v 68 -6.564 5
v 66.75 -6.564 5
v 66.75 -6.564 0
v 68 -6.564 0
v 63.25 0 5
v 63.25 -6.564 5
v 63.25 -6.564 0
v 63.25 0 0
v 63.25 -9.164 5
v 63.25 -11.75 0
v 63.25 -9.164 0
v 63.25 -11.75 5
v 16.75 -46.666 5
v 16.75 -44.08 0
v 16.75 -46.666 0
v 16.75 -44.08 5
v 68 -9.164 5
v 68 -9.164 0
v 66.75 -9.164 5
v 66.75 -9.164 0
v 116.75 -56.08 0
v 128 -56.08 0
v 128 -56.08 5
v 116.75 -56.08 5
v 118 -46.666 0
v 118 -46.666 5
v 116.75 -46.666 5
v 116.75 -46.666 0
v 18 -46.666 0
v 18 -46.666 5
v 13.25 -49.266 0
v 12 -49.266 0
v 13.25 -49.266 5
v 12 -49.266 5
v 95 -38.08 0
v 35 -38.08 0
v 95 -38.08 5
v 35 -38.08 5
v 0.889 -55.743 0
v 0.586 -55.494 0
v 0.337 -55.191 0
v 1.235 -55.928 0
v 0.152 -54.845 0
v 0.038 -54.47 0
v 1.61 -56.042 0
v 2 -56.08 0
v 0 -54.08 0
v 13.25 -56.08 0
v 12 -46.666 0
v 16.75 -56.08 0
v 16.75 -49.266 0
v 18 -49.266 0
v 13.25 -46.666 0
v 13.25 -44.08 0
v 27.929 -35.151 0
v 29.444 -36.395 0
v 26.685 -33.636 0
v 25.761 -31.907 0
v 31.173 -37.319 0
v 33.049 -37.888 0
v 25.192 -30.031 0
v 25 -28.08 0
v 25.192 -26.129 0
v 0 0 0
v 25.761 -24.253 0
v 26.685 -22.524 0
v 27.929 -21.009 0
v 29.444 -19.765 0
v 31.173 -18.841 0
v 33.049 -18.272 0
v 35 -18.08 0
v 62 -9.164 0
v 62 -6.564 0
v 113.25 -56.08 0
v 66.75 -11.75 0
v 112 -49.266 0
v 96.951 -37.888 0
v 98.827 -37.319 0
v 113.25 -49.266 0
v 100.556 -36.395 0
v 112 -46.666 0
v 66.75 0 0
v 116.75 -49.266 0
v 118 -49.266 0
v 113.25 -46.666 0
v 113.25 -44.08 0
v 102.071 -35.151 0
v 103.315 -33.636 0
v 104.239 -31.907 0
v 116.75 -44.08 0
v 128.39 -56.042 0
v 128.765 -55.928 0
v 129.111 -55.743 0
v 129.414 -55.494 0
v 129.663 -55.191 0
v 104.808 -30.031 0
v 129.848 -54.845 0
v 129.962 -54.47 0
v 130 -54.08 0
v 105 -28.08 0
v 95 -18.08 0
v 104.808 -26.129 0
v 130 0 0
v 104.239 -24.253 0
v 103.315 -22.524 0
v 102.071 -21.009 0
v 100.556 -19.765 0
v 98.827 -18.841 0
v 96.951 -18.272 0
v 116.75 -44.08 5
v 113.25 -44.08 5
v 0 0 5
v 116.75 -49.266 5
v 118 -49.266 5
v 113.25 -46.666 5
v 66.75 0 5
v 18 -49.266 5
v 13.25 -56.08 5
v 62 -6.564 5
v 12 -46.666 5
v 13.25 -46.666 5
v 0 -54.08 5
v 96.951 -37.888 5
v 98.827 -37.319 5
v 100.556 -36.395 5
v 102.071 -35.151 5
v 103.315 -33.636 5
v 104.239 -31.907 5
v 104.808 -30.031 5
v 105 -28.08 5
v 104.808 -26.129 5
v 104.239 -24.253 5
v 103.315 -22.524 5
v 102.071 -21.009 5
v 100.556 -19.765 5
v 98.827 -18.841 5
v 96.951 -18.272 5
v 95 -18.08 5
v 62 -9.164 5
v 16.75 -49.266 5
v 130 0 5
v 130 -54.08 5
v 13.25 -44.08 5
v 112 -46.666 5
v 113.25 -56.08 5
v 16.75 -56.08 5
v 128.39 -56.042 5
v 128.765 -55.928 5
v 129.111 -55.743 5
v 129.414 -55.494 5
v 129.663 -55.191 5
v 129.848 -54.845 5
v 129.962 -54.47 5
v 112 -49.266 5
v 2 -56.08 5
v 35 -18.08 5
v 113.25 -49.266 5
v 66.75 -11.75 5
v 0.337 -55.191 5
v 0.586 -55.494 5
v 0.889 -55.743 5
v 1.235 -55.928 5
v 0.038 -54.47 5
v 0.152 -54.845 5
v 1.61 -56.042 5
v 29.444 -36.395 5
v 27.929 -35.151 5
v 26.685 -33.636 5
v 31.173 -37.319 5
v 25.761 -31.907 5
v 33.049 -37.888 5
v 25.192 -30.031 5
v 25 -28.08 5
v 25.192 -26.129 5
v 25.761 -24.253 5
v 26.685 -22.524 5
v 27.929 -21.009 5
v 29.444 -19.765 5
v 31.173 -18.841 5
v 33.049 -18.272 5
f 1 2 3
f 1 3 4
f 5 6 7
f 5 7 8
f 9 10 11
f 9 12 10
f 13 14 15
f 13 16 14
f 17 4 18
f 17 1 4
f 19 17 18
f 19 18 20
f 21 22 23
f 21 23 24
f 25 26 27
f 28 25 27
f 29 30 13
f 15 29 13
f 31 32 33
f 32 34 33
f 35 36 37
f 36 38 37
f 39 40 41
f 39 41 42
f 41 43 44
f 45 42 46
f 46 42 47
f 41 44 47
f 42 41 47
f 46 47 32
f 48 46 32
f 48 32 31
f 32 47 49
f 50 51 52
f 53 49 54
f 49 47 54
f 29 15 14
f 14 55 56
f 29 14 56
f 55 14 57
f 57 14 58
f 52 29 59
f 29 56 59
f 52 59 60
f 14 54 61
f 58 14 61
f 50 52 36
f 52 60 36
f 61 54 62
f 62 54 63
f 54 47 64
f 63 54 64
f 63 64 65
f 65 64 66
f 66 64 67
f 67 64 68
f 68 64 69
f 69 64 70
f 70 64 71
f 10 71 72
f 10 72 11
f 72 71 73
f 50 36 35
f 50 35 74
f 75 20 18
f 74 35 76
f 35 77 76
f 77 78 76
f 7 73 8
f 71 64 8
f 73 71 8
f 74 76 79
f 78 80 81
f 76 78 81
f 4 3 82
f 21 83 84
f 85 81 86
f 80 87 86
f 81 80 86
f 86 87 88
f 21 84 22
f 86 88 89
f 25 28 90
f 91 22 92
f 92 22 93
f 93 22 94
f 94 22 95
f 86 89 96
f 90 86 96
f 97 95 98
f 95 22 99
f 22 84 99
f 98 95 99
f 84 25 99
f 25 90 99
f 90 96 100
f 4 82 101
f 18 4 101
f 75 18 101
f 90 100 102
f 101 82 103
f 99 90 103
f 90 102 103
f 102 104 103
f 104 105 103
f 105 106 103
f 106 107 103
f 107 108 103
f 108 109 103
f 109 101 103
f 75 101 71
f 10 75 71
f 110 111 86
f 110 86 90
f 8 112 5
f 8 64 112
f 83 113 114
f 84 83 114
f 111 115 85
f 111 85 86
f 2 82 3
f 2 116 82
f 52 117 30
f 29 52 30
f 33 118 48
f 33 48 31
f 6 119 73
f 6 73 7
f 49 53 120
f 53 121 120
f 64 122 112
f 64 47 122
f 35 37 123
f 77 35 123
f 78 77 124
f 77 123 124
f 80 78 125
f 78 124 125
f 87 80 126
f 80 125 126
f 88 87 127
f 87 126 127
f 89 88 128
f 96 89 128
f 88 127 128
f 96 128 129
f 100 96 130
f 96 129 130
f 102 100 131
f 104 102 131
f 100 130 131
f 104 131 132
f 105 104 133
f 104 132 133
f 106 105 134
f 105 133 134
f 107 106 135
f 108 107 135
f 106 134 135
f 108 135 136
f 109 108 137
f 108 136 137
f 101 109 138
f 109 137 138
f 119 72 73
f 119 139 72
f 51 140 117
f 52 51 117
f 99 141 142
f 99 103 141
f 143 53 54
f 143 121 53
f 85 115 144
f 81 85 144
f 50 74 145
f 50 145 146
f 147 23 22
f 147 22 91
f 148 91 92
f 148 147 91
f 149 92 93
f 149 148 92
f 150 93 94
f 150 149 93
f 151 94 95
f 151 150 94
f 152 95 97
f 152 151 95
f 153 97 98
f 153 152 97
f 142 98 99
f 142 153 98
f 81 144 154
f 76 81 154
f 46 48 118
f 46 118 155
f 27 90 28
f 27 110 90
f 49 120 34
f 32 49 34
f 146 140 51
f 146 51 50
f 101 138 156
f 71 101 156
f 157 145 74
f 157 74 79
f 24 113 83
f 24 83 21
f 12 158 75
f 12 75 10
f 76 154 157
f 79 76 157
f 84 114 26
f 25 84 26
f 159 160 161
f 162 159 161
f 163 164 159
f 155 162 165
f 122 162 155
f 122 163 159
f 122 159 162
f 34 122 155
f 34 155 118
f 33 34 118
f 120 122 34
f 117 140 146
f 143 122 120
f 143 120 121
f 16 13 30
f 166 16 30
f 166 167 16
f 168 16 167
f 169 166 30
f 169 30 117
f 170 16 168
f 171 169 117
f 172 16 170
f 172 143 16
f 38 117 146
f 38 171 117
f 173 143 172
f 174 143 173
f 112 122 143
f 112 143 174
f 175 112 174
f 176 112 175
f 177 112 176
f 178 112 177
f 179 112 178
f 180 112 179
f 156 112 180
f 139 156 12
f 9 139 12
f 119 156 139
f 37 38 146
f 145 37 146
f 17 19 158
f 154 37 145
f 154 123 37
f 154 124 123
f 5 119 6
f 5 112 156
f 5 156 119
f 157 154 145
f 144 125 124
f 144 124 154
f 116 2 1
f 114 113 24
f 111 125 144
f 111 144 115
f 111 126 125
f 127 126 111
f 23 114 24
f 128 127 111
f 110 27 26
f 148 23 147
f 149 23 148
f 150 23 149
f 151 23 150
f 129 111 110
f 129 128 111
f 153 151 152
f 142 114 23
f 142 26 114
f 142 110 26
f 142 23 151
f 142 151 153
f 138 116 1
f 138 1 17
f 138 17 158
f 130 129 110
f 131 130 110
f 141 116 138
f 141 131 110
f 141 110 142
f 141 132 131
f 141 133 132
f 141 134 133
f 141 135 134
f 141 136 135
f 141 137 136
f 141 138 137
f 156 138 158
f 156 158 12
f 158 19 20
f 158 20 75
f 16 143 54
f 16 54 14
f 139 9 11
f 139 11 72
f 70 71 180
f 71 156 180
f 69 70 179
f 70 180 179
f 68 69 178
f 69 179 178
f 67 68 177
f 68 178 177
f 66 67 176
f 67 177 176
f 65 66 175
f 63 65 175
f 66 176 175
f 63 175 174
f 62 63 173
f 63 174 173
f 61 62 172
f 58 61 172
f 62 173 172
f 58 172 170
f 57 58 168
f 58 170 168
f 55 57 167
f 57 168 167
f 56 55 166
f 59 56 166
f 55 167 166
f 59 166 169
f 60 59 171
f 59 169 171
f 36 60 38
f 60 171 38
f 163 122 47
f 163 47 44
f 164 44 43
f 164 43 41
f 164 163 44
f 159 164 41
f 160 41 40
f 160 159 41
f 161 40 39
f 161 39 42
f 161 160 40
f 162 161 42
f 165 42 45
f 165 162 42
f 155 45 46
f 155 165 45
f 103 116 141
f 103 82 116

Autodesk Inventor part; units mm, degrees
ref_plane "YZ Plane" through (0, 0, 0) normal (1, 0, 0) x (0, 1, 0)
ref_plane "XZ Plane" through (0, 0, 0) normal (0, 1, 0) x (-1, 0, 0)
ref_plane "XY Plane" through (0, 0, 0) normal (0, 0, 1) x (1, 0, 0)
sketch "Boceto1" plane through (0, 0, 0) normal (0, 0, 1) x (1, 0, 0)
  line L0 (0, 0) -> (130, 0)
  line L1 (130, 0) -> (130, -56.08)
  line L2 (130, -56.08) -> (0, -56.08)
  line L3 (0, -56.08) -> (0, 0)
  dimension "d0" = 130
  dimension "d1" = 56.08
extrude "Extrusión1" add sketch "Boceto1" along normal blind 5
sketch "Boceto2" plane through (0, 0, 5) normal (0, 0, 1) x (1, 0, 0)
  line L0 (130, 0) -> (130, -56.08) projected
  line L1 (0, -56.08) -> (0, 0) projected
  line L2 (130, -56.08) -> (0, -56.08) projected
  line L3 (16.75, -57.2435) -> (13.25, -57.2435)
  line L4 (13.25, -44.08) -> (16.75, -44.08)
  line L5 (116.75, -57.2435) -> (113.25, -57.2435)
  line L6 (113.25, -44.08) -> (116.75, -44.08)
  line L7 (12, -46.6661) -> (12, -49.2661)
  line L8 (18, -49.2661) -> (18, -46.6661)
  line L9 (112, -46.6661) -> (112, -49.2661)
  line L10 (118, -49.2661) -> (118, -46.6661)
  line L11 (12, -49.2661) -> (13.25, -49.2661)
  line L12 (16.75, -49.2661) -> (18, -49.2661)
  line L13 (16.75, -44.08) -> (16.75, -46.6661)
  line L14 (16.75, -49.2661) -> (16.75, -57.2435)
  line L15 (18, -46.6661) -> (16.75, -46.6661)
  line L16 (13.25, -46.6661) -> (12, -46.6661)
  line L17 (13.25, -57.2435) -> (13.25, -49.2661)
  line L18 (13.25, -46.6661) -> (13.25, -44.08)
  line L19 (112, -49.2661) -> (113.25, -49.2661)
  line L20 (116.75, -49.2661) -> (118, -49.2661)
  line L21 (116.75, -44.08) -> (116.75, -46.6661)
  line L22 (116.75, -49.2661) -> (116.75, -57.2435)
  line L23 (118, -46.6661) -> (116.75, -46.6661)
  line L24 (113.25, -46.6661) -> (112, -46.6661)
  line L25 (113.25, -57.2435) -> (113.25, -49.2661)
  line L26 (113.25, -46.6661) -> (113.25, -44.08)
  dimension "d7" = 6
  dimension "d8" = 12
  dimension "d14" = 13.25
  dimension "d15" = 1.25
  dimension "d16" = 1.25
  dimension "d17" = 13.25
  dimension "d18" = 3.5
extrude "Extrusión2" cut sketch "Boceto2" against normal blind 5
sketch "Boceto3" plane through (0, 0, 5) normal (0, 0, 1) x (1, 0, 0)
  line L0 (0, -56.08) -> (0, 0) projected
  line L1 (63.25, -6.5636) -> (63.25, 0.2503)
  line L2 (66.75, 0.2503) -> (66.75, -6.5636)
  line L3 (66.75, -6.5636) -> (68, -6.5636)
  line L4 (68, -6.5636) -> (68, -9.1636)
  line L5 (68, -9.1636) -> (66.75, -9.1636)
  line L6 (66.75, -9.1636) -> (66.75, -11.7497)
  line L7 (66.75, -11.7497) -> (63.25, -11.7497)
  line L8 (63.25, -11.7497) -> (63.25, -9.1636)
  line L9 (63.25, -9.1636) -> (62, -9.1636)
  line L10 (62, -9.1636) -> (62, -6.5636)
  line L11 (62, -6.5636) -> (63.25, -6.5636)
  line L12 (63.25, 0.2503) -> (66.75, 0.2503)
  dimension "d21" = 63.25
extrude "Extrusión3" cut sketch "Boceto3" against normal blind 5
fillet "Empalme1" radius 2 1 edges at (130, -56.08, 2.5)
fillet "Empalme2" radius 2 1 edges at (0, -56.08, 2.5)
sketch "Boceto4" plane through (0, 0, 5) normal (0, 0, 1) x (1, 0, 0)
  line L0 (113.25, -56.08) -> (16.75, -56.08) projected
  line L1 (0, -54.08) -> (0, 0) projected
  arc A0 (35, -18.08) -> (35, -38.08) centre (35, -28.08) ccw
  arc A1 (95, -38.08) -> (95, -18.08) centre (95, -28.08) ccw
  line L2 (35, -38.08) -> (95, -38.08)
  line L3 (95, -18.08) -> (35, -18.08)
  dimension "d26" = 20
  dimension "d27" = 20
  dimension "d28" = 60
  dimension "d29" = 35
  dimension "d30" = 28
extrude "Extrusión4" cut sketch "Boceto4" against normal blind 5
properties part number "pieza protectora 2"
